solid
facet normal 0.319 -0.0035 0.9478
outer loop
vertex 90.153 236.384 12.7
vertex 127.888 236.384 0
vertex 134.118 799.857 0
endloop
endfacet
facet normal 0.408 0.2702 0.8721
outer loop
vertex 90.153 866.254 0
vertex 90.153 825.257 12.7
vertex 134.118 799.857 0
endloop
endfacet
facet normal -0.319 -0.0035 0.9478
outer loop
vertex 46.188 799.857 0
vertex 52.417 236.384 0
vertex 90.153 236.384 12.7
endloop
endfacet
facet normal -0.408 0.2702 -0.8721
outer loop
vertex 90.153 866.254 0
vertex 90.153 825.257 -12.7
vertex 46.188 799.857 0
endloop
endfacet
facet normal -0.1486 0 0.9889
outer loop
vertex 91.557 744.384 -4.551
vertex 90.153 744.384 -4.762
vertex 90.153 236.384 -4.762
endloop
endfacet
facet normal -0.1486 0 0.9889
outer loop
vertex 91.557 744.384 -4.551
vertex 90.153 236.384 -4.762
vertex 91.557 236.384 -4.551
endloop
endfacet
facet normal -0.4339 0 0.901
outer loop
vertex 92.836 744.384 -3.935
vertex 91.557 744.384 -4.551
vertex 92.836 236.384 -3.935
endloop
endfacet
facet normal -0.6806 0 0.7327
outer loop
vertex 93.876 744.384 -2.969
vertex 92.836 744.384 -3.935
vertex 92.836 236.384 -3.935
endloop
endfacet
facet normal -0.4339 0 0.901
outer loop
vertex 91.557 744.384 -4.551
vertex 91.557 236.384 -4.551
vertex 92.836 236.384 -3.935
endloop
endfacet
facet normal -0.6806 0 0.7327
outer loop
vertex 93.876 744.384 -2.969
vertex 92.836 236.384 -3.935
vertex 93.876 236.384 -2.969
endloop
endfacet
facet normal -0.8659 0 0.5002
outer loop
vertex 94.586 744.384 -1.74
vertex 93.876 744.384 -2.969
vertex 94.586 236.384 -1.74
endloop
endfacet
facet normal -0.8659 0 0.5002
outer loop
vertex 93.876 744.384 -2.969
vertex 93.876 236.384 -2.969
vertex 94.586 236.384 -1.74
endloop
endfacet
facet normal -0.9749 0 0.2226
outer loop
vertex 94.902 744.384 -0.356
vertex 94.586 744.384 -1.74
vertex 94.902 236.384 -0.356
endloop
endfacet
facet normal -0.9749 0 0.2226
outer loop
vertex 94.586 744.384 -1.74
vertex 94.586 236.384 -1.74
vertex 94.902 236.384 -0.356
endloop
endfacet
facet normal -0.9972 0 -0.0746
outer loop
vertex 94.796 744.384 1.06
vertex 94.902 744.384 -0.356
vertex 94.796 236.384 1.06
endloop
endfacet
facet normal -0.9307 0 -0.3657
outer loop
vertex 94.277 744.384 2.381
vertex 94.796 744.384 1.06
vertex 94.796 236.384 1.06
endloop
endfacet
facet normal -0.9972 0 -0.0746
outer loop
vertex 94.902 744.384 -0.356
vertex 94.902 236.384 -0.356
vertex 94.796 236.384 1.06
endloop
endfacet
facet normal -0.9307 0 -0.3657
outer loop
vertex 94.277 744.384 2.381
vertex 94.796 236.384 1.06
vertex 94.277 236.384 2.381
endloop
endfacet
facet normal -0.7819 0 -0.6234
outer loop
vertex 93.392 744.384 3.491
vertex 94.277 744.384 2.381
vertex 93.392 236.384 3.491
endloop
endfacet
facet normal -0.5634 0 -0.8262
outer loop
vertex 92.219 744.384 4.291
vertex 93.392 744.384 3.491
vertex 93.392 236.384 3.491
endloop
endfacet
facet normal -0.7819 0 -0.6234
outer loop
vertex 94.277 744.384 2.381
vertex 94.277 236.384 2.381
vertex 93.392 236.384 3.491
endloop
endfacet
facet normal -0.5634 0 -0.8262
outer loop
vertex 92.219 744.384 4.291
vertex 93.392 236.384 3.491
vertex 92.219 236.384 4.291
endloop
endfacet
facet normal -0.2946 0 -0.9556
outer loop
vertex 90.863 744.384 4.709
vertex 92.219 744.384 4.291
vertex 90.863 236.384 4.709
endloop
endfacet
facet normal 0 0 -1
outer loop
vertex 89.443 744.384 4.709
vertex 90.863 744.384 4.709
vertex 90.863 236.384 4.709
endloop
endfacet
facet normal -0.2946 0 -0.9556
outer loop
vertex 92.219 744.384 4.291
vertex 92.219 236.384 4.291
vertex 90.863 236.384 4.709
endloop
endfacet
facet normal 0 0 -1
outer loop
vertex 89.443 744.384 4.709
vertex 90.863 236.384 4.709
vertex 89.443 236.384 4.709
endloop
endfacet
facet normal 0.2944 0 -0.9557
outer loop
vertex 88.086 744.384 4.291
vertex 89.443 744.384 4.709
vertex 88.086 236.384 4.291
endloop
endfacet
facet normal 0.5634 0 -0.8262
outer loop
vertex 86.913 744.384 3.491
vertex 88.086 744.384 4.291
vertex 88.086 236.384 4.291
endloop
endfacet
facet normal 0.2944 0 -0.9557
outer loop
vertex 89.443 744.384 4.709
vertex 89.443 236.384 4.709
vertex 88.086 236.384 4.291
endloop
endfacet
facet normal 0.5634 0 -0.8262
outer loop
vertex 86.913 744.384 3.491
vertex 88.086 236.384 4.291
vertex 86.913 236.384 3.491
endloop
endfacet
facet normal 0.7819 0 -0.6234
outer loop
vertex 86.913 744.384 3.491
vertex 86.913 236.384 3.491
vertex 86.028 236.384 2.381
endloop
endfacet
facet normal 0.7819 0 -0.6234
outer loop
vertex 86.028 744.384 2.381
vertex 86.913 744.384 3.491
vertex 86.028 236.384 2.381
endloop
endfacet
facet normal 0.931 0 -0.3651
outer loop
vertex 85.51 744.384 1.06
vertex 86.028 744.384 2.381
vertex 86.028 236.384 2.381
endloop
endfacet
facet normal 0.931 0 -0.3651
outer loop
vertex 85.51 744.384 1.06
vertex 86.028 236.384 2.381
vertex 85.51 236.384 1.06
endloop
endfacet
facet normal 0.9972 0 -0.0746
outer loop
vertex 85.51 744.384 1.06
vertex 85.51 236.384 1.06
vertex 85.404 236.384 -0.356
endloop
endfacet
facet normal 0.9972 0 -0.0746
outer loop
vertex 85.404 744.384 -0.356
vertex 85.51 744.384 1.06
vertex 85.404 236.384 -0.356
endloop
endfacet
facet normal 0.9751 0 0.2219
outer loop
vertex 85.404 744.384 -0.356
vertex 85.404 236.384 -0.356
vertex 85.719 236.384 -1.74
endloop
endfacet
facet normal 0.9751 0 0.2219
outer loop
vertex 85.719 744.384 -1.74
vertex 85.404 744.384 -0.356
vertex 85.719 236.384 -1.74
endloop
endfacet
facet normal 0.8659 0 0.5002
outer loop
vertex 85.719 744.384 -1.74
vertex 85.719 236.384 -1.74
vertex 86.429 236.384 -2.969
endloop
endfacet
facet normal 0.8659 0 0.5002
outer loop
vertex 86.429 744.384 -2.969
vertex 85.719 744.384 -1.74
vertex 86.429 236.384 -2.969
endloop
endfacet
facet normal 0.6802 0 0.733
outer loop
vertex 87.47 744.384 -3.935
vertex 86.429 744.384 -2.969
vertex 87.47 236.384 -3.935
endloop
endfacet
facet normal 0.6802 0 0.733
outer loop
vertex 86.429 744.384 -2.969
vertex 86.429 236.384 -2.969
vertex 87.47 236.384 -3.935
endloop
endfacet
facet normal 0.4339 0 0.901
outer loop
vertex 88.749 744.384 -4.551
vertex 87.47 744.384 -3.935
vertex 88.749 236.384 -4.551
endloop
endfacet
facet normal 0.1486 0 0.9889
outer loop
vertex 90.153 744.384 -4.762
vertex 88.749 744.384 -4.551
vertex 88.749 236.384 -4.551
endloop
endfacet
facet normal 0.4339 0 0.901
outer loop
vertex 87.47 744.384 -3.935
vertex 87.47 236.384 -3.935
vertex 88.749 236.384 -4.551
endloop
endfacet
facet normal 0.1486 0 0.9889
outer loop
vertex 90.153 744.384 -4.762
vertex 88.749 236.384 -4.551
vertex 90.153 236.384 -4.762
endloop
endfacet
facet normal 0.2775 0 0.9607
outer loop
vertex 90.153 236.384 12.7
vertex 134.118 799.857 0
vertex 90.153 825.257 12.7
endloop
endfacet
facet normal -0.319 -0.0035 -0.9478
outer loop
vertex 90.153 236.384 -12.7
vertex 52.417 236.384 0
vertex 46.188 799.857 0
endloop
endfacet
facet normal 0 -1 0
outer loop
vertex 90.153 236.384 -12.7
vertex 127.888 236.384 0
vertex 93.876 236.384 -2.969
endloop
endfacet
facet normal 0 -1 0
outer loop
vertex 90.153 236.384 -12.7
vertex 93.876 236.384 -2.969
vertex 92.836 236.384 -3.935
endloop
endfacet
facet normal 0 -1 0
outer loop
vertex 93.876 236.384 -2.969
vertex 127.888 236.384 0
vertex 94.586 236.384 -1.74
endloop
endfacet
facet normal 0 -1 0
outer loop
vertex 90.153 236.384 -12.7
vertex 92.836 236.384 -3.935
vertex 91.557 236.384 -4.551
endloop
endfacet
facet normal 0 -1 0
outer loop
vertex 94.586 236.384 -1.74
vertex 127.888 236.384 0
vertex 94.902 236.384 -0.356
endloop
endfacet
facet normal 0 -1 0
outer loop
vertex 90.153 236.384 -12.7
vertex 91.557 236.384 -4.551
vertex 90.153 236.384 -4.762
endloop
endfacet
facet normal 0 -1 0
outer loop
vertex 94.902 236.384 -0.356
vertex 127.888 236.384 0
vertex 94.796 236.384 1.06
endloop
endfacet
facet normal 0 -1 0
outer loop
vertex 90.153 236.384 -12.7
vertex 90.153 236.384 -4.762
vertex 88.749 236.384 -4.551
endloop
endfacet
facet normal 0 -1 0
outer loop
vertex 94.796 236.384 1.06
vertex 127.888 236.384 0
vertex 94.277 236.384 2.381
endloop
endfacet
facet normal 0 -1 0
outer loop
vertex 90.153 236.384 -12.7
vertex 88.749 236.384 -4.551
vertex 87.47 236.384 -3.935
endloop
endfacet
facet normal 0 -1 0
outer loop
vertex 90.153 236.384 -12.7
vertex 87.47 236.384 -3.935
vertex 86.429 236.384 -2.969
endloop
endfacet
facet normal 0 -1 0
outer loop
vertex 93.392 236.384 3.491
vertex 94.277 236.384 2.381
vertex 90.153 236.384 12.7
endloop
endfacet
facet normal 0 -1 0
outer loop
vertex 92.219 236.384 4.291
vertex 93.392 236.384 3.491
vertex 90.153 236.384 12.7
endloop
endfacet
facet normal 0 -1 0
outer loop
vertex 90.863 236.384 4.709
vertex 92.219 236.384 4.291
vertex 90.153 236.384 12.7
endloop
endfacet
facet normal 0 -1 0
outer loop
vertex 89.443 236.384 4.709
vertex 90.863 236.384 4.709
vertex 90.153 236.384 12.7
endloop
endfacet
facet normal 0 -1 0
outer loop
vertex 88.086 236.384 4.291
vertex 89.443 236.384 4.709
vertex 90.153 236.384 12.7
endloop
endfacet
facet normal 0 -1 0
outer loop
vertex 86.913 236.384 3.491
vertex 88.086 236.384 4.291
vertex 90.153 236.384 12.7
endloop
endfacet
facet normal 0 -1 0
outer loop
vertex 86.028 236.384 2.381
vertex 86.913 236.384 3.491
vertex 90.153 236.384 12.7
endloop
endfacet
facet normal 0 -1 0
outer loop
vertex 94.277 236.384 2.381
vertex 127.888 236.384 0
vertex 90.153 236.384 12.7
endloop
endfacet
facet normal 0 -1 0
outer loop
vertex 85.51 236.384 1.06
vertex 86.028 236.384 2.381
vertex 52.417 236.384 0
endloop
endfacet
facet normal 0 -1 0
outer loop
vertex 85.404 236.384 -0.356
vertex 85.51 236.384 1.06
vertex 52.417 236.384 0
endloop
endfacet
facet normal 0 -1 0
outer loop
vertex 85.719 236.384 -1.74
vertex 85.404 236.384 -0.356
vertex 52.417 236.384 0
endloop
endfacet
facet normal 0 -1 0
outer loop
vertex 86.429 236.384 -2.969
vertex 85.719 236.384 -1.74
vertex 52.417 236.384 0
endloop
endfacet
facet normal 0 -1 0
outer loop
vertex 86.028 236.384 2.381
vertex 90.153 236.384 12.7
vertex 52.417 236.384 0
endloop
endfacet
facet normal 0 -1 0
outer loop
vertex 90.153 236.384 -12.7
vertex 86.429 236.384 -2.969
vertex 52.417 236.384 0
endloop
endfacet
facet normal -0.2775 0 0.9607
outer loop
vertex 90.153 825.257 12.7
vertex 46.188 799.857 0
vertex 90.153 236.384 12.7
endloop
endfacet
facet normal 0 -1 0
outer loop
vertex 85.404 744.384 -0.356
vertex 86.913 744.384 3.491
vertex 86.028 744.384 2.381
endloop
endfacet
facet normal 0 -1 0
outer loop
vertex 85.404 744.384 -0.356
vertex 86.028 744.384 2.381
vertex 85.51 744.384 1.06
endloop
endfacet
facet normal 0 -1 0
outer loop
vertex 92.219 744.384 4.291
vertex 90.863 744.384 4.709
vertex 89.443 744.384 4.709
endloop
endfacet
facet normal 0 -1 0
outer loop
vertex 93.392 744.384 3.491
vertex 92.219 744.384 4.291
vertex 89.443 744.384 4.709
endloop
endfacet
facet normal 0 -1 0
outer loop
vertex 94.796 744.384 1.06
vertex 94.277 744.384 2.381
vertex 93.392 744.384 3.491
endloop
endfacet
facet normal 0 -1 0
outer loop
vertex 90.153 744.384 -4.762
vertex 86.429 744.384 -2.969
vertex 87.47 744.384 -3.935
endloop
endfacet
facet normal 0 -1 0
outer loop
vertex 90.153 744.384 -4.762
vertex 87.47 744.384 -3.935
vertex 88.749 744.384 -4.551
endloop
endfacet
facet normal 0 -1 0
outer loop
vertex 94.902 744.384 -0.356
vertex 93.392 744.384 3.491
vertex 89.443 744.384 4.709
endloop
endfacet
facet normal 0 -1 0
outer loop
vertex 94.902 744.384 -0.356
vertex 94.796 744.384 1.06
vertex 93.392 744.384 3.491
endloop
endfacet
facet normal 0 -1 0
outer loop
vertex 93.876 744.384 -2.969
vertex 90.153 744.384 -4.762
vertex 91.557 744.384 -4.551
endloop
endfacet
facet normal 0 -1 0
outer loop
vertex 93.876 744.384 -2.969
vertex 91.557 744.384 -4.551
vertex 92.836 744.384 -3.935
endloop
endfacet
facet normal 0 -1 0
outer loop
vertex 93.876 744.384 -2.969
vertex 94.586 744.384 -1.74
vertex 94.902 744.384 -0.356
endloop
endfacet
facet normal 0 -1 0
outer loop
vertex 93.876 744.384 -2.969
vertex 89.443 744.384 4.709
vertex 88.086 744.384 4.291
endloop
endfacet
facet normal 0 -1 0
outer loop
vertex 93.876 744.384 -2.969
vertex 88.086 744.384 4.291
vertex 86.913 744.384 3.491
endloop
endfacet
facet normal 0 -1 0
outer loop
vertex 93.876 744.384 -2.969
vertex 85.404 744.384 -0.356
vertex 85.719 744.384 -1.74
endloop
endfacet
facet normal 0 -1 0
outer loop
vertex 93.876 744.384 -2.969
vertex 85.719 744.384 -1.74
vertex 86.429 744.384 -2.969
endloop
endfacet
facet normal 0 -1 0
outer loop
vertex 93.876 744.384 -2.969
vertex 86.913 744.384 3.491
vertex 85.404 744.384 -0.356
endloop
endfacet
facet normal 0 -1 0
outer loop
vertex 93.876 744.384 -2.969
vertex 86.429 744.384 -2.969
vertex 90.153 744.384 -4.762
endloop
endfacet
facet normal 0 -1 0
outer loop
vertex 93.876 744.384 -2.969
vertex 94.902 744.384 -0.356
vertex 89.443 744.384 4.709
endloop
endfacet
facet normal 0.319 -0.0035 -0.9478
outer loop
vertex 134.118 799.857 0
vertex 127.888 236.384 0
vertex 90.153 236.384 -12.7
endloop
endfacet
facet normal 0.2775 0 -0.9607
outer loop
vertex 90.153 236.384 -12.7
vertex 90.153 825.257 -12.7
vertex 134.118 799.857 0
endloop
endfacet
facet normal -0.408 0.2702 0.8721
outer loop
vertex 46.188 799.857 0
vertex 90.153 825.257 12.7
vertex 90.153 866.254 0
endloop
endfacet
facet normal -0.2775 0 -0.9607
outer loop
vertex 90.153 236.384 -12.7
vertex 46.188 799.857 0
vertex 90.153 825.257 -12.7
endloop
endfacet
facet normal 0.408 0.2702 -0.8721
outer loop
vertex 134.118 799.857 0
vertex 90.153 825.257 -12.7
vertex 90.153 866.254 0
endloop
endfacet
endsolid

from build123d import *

# Parameters (mm, degrees)
BOSS_EXTRUDE1_DEPTH = 12.7
SKETCH6_W           = 114.815330755
SKETCH6_H           = 104.276185761
CUT_EXTRUDE3_DEPTH  = 12.7
SKETCH7_W           = 122.360161844
SKETCH7_H           = 106.085242249
CUT_EXTRUDE4_DEPTH  = 12.7
CUT_EXTRUDE5_DEPTH  = 877.31520365
SKETCH9_W           = 128.341826347
SKETCH9_H           = 668.528804507
CUT_EXTRUDE6_DEPTH  = 877.394501708
SKETCH10_W          = 113.997044676
SKETCH10_H          = 648.207852324
CUT_EXTRUDE7_DEPTH  = 876.98732182
SKETCH12_W          = 87.20410609
SKETCH12_H          = 734.299119323
CUT_EXTRUDE9_DEPTH  = 868.461646496
SKETCH14_W          = 100.100558247
SKETCH14_H          = 114.490742636
CUT_EXTRUDE10_DEPTH = 12.7
SKETCH15_W          = 127.653675673
SKETCH15_H          = 100.172241776
CUT_EXTRUDE11_DEPTH = 861.862470972
SKETCH16_W          = 131.855297217
SKETCH16_H          = 679.360405527
CUT_EXTRUDE12_DEPTH = 877.165513574
SKETCH17_W          = 119.305490094
SKETCH17_H          = 642.509473181
CUT_EXTRUDE13_DEPTH = 877.394501708
SKETCH18_W          = 98.994393467
SKETCH18_H          = 639.457225447
CUT_EXTRUDE14_DEPTH = 877.31520365
SKETCH19_W          = 99.565921338
SKETCH19_H          = 666.000675121
CUT_EXTRUDE15_DEPTH = 877.394501708
SKETCH20_R          = 4.7625
CUT_EXTRUDE16_DEPTH = 508


# Read off the part's stored shape, not the designer's step: Mirror1
with BuildPart() as part:
    # Sketch1 → Boss-Extrude1 (new, symmetric)
    with BuildSketch(Plane.XY):
        Polygon((52.417084438, 236.384308448), (90.152766869, 236.384308448), (90.152766869, 866.253701631), (46.187524325, 799.857212891), align=None)
        Polygon((90.152766869, 866.253701631), (90.152766869, 236.384308448), (127.8884493, 236.384308448), (134.118009413, 799.857212891), align=None)
    extrude(amount=BOSS_EXTRUDE1_DEPTH, both=True)

    # Sketch6 → Cut-Extrude3 (cut)
    with BuildSketch(Plane(origin=(-80.475493735, 53.287826933, 172.016834397), x_dir=(-0.9129832156192912, -0.12073015458483159, -0.3897253876402993), z_dir=(0.4079971176337633, -0.27016025356830164, -0.8720962042082583))):
        with Locations((-159.579476902, 801.401673743)):
            Rectangle(SKETCH6_W, SKETCH6_H)
    extrude(amount=-CUT_EXTRUDE3_DEPTH, mode=Mode.SUBTRACT)

    # Sketch7 → Cut-Extrude4 (cut)
    with BuildSketch(Plane(origin=(110.489450025, 73.161933124, 236.171839964), x_dir=(0.9129832156192915, -0.12073015458482926, -0.3897253876402993), z_dir=(0.4079971176337626, 0.2701602535682969, 0.8720962042082602))):
        with Locations((1.839292518, 801.972236913)):
            Rectangle(SKETCH7_W, SKETCH7_H)
    extrude(amount=CUT_EXTRUDE4_DEPTH, mode=Mode.SUBTRACT)

    # Sketch8 → Cut-Extrude5 (cut, through all)
    with BuildSketch(Plane(origin=(12.74567879, -0.140911784, 37.871408439), x_dir=(0.947764978993365, 0.0011868122313308312, -0.31896729623965236), z_dir=(0.31896950417509595, -0.0035264157067469155, 0.9477584184793911))):
        Polygon((81.673294324, 236.429925956), (128.061632698, 799.851676208), (231.741614255, 799.851676208), (231.741614255, 224.074314905), align=None)
    extrude(amount=CUT_EXTRUDE5_DEPTH, mode=Mode.SUBTRACT)

    # Sketch9 → Cut-Extrude6 (cut, through all)
    with BuildSketch(Plane(origin=(10.329270127, 0, 35.75817846), x_dir=(-0.9607204173379366, 0, 0.27751807096119224), z_dir=(-0.27751807096119224, 0, -0.9607204173379366))):
        with Locations((-110.06191607, 531.852930857)):
            Rectangle(SKETCH9_W, SKETCH9_H)
    extrude(amount=-CUT_EXTRUDE6_DEPTH, mode=Mode.SUBTRACT)

    # Sketch10 → Cut-Extrude7 (cut, through all)
    with BuildSketch(Plane(origin=(6.175448175, 0.216498836, -18.349193008), x_dir=(-0.9477710226369341, 0.0037629901372113698, -0.3189293472776808), z_dir=(0.31895154592781055, 0.011181801925878497, -0.9477050588954087))):
        with Locations((-63.898815232, 515.571273572)):
            Rectangle(SKETCH10_W, SKETCH10_H)
    extrude(amount=-CUT_EXTRUDE7_DEPTH, mode=Mode.SUBTRACT)

    # Sketch12 → Cut-Extrude9 (cut, through all)
    with BuildSketch(Plane(origin=(90.152766869, 0, 0), x_dir=(0, 0, -1), z_dir=(1, 0, 0))):
        with Locations((-8.892958554, 531.759474075)):
            Rectangle(SKETCH12_W, SKETCH12_H)
    extrude(amount=-CUT_EXTRUDE9_DEPTH, mode=Mode.SUBTRACT)

    # Mirror1: part across plane


with BuildPart() as part_1:
    add(part.part)
    add(part.part.mirror(Plane.ZY.offset(-90.152766869)))

    # Sketch14 → Cut-Extrude10 (cut)
    with BuildSketch(Plane(origin=(110.489450025, 73.161933124, -236.171839964), x_dir=(0.9129832156192876, -0.12073015458483696, 0.3897253876403062), z_dir=(-0.40799711763377144, -0.2701602535683071, 0.8720962042082528))):
        with Locations((-13.369077843, 796.553249818)):
            Rectangle(SKETCH14_W, SKETCH14_H)
    extrude(amount=-CUT_EXTRUDE10_DEPTH, mode=Mode.SUBTRACT)

    # Sketch15 → Cut-Extrude11 (cut, through all)
    with BuildSketch(Plane(origin=(-80.475493735, 53.287826933, -172.016834397), x_dir=(-0.9129832156192877, -0.12073015458483585, 0.3897253876403061), z_dir=(-0.4079971176337711, 0.270160253568305, -0.8720962042082536))):
        with Locations((-157.367388135, 783.503693327)):
            Rectangle(SKETCH15_W, SKETCH15_H)
    extrude(amount=CUT_EXTRUDE11_DEPTH, mode=Mode.SUBTRACT)

    # Sketch16 → Cut-Extrude12 (cut, through all)
    with BuildSketch(Plane(origin=(5.598884712, 0.061899319, 16.636042161), x_dir=(0.9477649789933651, -0.0011868122313305589, -0.3189672962396519), z_dir=(0.31896950417509556, 0.0035264157067461093, 0.9477584184793914))):
        with Locations((56.359358162, 528.47269788)):
            Rectangle(SKETCH16_W, SKETCH16_H)
    extrude(amount=-CUT_EXTRUDE12_DEPTH, mode=Mode.SUBTRACT)

    # Sketch17 → Cut-Extrude13 (cut, through all)
    with BuildSketch(Plane(origin=(3.557191293, 0, 12.314391965), x_dir=(0.9607204173379333, 0, -0.27751807096120285), z_dir=(0.27751807096120285, 0, 0.9607204173379335))):
        with Locations((80.7028718, 538.35243952)):
            Rectangle(SKETCH17_W, SKETCH17_H)
    extrude(amount=-CUT_EXTRUDE13_DEPTH, mode=Mode.SUBTRACT)

    # Sketch18 → Cut-Extrude14 (cut, through all)
    with BuildSketch(Plane(origin=(12.74567879, -0.140911784, -37.871408439), x_dir=(-0.9477649789933651, -0.001186812231330454, -0.31896729623965203), z_dir=(0.31896950417509573, -0.0035264157067457975, -0.9477584184793914))):
        with Locations((-106.935938294, 529.421515118)):
            Rectangle(SKETCH18_W, SKETCH18_H)
    extrude(amount=CUT_EXTRUDE14_DEPTH, mode=Mode.SUBTRACT)

    # Sketch19 → Cut-Extrude15 (cut, through all)
    with BuildSketch(Plane(origin=(10.329270127, 0, -35.75817846), x_dir=(0.9607204173379326, 0, 0.2775180709612057), z_dir=(-0.2775180709612056, 0, 0.9607204173379325))):
        with Locations((102.080018676, 535.484996681)):
            Rectangle(SKETCH19_W, SKETCH19_H)
    extrude(amount=-CUT_EXTRUDE15_DEPTH, mode=Mode.SUBTRACT)

    # Sketch20 → Cut-Extrude16 (cut)
    with BuildSketch(Plane.XZ.offset(-236.384308448)):
        with Locations(Location((90.152766869, 0, 0), (0, 0, 270))):
            Circle(SKETCH20_R)
    extrude(amount=-CUT_EXTRUDE16_DEPTH, mode=Mode.SUBTRACT)


solid = part_1.part
